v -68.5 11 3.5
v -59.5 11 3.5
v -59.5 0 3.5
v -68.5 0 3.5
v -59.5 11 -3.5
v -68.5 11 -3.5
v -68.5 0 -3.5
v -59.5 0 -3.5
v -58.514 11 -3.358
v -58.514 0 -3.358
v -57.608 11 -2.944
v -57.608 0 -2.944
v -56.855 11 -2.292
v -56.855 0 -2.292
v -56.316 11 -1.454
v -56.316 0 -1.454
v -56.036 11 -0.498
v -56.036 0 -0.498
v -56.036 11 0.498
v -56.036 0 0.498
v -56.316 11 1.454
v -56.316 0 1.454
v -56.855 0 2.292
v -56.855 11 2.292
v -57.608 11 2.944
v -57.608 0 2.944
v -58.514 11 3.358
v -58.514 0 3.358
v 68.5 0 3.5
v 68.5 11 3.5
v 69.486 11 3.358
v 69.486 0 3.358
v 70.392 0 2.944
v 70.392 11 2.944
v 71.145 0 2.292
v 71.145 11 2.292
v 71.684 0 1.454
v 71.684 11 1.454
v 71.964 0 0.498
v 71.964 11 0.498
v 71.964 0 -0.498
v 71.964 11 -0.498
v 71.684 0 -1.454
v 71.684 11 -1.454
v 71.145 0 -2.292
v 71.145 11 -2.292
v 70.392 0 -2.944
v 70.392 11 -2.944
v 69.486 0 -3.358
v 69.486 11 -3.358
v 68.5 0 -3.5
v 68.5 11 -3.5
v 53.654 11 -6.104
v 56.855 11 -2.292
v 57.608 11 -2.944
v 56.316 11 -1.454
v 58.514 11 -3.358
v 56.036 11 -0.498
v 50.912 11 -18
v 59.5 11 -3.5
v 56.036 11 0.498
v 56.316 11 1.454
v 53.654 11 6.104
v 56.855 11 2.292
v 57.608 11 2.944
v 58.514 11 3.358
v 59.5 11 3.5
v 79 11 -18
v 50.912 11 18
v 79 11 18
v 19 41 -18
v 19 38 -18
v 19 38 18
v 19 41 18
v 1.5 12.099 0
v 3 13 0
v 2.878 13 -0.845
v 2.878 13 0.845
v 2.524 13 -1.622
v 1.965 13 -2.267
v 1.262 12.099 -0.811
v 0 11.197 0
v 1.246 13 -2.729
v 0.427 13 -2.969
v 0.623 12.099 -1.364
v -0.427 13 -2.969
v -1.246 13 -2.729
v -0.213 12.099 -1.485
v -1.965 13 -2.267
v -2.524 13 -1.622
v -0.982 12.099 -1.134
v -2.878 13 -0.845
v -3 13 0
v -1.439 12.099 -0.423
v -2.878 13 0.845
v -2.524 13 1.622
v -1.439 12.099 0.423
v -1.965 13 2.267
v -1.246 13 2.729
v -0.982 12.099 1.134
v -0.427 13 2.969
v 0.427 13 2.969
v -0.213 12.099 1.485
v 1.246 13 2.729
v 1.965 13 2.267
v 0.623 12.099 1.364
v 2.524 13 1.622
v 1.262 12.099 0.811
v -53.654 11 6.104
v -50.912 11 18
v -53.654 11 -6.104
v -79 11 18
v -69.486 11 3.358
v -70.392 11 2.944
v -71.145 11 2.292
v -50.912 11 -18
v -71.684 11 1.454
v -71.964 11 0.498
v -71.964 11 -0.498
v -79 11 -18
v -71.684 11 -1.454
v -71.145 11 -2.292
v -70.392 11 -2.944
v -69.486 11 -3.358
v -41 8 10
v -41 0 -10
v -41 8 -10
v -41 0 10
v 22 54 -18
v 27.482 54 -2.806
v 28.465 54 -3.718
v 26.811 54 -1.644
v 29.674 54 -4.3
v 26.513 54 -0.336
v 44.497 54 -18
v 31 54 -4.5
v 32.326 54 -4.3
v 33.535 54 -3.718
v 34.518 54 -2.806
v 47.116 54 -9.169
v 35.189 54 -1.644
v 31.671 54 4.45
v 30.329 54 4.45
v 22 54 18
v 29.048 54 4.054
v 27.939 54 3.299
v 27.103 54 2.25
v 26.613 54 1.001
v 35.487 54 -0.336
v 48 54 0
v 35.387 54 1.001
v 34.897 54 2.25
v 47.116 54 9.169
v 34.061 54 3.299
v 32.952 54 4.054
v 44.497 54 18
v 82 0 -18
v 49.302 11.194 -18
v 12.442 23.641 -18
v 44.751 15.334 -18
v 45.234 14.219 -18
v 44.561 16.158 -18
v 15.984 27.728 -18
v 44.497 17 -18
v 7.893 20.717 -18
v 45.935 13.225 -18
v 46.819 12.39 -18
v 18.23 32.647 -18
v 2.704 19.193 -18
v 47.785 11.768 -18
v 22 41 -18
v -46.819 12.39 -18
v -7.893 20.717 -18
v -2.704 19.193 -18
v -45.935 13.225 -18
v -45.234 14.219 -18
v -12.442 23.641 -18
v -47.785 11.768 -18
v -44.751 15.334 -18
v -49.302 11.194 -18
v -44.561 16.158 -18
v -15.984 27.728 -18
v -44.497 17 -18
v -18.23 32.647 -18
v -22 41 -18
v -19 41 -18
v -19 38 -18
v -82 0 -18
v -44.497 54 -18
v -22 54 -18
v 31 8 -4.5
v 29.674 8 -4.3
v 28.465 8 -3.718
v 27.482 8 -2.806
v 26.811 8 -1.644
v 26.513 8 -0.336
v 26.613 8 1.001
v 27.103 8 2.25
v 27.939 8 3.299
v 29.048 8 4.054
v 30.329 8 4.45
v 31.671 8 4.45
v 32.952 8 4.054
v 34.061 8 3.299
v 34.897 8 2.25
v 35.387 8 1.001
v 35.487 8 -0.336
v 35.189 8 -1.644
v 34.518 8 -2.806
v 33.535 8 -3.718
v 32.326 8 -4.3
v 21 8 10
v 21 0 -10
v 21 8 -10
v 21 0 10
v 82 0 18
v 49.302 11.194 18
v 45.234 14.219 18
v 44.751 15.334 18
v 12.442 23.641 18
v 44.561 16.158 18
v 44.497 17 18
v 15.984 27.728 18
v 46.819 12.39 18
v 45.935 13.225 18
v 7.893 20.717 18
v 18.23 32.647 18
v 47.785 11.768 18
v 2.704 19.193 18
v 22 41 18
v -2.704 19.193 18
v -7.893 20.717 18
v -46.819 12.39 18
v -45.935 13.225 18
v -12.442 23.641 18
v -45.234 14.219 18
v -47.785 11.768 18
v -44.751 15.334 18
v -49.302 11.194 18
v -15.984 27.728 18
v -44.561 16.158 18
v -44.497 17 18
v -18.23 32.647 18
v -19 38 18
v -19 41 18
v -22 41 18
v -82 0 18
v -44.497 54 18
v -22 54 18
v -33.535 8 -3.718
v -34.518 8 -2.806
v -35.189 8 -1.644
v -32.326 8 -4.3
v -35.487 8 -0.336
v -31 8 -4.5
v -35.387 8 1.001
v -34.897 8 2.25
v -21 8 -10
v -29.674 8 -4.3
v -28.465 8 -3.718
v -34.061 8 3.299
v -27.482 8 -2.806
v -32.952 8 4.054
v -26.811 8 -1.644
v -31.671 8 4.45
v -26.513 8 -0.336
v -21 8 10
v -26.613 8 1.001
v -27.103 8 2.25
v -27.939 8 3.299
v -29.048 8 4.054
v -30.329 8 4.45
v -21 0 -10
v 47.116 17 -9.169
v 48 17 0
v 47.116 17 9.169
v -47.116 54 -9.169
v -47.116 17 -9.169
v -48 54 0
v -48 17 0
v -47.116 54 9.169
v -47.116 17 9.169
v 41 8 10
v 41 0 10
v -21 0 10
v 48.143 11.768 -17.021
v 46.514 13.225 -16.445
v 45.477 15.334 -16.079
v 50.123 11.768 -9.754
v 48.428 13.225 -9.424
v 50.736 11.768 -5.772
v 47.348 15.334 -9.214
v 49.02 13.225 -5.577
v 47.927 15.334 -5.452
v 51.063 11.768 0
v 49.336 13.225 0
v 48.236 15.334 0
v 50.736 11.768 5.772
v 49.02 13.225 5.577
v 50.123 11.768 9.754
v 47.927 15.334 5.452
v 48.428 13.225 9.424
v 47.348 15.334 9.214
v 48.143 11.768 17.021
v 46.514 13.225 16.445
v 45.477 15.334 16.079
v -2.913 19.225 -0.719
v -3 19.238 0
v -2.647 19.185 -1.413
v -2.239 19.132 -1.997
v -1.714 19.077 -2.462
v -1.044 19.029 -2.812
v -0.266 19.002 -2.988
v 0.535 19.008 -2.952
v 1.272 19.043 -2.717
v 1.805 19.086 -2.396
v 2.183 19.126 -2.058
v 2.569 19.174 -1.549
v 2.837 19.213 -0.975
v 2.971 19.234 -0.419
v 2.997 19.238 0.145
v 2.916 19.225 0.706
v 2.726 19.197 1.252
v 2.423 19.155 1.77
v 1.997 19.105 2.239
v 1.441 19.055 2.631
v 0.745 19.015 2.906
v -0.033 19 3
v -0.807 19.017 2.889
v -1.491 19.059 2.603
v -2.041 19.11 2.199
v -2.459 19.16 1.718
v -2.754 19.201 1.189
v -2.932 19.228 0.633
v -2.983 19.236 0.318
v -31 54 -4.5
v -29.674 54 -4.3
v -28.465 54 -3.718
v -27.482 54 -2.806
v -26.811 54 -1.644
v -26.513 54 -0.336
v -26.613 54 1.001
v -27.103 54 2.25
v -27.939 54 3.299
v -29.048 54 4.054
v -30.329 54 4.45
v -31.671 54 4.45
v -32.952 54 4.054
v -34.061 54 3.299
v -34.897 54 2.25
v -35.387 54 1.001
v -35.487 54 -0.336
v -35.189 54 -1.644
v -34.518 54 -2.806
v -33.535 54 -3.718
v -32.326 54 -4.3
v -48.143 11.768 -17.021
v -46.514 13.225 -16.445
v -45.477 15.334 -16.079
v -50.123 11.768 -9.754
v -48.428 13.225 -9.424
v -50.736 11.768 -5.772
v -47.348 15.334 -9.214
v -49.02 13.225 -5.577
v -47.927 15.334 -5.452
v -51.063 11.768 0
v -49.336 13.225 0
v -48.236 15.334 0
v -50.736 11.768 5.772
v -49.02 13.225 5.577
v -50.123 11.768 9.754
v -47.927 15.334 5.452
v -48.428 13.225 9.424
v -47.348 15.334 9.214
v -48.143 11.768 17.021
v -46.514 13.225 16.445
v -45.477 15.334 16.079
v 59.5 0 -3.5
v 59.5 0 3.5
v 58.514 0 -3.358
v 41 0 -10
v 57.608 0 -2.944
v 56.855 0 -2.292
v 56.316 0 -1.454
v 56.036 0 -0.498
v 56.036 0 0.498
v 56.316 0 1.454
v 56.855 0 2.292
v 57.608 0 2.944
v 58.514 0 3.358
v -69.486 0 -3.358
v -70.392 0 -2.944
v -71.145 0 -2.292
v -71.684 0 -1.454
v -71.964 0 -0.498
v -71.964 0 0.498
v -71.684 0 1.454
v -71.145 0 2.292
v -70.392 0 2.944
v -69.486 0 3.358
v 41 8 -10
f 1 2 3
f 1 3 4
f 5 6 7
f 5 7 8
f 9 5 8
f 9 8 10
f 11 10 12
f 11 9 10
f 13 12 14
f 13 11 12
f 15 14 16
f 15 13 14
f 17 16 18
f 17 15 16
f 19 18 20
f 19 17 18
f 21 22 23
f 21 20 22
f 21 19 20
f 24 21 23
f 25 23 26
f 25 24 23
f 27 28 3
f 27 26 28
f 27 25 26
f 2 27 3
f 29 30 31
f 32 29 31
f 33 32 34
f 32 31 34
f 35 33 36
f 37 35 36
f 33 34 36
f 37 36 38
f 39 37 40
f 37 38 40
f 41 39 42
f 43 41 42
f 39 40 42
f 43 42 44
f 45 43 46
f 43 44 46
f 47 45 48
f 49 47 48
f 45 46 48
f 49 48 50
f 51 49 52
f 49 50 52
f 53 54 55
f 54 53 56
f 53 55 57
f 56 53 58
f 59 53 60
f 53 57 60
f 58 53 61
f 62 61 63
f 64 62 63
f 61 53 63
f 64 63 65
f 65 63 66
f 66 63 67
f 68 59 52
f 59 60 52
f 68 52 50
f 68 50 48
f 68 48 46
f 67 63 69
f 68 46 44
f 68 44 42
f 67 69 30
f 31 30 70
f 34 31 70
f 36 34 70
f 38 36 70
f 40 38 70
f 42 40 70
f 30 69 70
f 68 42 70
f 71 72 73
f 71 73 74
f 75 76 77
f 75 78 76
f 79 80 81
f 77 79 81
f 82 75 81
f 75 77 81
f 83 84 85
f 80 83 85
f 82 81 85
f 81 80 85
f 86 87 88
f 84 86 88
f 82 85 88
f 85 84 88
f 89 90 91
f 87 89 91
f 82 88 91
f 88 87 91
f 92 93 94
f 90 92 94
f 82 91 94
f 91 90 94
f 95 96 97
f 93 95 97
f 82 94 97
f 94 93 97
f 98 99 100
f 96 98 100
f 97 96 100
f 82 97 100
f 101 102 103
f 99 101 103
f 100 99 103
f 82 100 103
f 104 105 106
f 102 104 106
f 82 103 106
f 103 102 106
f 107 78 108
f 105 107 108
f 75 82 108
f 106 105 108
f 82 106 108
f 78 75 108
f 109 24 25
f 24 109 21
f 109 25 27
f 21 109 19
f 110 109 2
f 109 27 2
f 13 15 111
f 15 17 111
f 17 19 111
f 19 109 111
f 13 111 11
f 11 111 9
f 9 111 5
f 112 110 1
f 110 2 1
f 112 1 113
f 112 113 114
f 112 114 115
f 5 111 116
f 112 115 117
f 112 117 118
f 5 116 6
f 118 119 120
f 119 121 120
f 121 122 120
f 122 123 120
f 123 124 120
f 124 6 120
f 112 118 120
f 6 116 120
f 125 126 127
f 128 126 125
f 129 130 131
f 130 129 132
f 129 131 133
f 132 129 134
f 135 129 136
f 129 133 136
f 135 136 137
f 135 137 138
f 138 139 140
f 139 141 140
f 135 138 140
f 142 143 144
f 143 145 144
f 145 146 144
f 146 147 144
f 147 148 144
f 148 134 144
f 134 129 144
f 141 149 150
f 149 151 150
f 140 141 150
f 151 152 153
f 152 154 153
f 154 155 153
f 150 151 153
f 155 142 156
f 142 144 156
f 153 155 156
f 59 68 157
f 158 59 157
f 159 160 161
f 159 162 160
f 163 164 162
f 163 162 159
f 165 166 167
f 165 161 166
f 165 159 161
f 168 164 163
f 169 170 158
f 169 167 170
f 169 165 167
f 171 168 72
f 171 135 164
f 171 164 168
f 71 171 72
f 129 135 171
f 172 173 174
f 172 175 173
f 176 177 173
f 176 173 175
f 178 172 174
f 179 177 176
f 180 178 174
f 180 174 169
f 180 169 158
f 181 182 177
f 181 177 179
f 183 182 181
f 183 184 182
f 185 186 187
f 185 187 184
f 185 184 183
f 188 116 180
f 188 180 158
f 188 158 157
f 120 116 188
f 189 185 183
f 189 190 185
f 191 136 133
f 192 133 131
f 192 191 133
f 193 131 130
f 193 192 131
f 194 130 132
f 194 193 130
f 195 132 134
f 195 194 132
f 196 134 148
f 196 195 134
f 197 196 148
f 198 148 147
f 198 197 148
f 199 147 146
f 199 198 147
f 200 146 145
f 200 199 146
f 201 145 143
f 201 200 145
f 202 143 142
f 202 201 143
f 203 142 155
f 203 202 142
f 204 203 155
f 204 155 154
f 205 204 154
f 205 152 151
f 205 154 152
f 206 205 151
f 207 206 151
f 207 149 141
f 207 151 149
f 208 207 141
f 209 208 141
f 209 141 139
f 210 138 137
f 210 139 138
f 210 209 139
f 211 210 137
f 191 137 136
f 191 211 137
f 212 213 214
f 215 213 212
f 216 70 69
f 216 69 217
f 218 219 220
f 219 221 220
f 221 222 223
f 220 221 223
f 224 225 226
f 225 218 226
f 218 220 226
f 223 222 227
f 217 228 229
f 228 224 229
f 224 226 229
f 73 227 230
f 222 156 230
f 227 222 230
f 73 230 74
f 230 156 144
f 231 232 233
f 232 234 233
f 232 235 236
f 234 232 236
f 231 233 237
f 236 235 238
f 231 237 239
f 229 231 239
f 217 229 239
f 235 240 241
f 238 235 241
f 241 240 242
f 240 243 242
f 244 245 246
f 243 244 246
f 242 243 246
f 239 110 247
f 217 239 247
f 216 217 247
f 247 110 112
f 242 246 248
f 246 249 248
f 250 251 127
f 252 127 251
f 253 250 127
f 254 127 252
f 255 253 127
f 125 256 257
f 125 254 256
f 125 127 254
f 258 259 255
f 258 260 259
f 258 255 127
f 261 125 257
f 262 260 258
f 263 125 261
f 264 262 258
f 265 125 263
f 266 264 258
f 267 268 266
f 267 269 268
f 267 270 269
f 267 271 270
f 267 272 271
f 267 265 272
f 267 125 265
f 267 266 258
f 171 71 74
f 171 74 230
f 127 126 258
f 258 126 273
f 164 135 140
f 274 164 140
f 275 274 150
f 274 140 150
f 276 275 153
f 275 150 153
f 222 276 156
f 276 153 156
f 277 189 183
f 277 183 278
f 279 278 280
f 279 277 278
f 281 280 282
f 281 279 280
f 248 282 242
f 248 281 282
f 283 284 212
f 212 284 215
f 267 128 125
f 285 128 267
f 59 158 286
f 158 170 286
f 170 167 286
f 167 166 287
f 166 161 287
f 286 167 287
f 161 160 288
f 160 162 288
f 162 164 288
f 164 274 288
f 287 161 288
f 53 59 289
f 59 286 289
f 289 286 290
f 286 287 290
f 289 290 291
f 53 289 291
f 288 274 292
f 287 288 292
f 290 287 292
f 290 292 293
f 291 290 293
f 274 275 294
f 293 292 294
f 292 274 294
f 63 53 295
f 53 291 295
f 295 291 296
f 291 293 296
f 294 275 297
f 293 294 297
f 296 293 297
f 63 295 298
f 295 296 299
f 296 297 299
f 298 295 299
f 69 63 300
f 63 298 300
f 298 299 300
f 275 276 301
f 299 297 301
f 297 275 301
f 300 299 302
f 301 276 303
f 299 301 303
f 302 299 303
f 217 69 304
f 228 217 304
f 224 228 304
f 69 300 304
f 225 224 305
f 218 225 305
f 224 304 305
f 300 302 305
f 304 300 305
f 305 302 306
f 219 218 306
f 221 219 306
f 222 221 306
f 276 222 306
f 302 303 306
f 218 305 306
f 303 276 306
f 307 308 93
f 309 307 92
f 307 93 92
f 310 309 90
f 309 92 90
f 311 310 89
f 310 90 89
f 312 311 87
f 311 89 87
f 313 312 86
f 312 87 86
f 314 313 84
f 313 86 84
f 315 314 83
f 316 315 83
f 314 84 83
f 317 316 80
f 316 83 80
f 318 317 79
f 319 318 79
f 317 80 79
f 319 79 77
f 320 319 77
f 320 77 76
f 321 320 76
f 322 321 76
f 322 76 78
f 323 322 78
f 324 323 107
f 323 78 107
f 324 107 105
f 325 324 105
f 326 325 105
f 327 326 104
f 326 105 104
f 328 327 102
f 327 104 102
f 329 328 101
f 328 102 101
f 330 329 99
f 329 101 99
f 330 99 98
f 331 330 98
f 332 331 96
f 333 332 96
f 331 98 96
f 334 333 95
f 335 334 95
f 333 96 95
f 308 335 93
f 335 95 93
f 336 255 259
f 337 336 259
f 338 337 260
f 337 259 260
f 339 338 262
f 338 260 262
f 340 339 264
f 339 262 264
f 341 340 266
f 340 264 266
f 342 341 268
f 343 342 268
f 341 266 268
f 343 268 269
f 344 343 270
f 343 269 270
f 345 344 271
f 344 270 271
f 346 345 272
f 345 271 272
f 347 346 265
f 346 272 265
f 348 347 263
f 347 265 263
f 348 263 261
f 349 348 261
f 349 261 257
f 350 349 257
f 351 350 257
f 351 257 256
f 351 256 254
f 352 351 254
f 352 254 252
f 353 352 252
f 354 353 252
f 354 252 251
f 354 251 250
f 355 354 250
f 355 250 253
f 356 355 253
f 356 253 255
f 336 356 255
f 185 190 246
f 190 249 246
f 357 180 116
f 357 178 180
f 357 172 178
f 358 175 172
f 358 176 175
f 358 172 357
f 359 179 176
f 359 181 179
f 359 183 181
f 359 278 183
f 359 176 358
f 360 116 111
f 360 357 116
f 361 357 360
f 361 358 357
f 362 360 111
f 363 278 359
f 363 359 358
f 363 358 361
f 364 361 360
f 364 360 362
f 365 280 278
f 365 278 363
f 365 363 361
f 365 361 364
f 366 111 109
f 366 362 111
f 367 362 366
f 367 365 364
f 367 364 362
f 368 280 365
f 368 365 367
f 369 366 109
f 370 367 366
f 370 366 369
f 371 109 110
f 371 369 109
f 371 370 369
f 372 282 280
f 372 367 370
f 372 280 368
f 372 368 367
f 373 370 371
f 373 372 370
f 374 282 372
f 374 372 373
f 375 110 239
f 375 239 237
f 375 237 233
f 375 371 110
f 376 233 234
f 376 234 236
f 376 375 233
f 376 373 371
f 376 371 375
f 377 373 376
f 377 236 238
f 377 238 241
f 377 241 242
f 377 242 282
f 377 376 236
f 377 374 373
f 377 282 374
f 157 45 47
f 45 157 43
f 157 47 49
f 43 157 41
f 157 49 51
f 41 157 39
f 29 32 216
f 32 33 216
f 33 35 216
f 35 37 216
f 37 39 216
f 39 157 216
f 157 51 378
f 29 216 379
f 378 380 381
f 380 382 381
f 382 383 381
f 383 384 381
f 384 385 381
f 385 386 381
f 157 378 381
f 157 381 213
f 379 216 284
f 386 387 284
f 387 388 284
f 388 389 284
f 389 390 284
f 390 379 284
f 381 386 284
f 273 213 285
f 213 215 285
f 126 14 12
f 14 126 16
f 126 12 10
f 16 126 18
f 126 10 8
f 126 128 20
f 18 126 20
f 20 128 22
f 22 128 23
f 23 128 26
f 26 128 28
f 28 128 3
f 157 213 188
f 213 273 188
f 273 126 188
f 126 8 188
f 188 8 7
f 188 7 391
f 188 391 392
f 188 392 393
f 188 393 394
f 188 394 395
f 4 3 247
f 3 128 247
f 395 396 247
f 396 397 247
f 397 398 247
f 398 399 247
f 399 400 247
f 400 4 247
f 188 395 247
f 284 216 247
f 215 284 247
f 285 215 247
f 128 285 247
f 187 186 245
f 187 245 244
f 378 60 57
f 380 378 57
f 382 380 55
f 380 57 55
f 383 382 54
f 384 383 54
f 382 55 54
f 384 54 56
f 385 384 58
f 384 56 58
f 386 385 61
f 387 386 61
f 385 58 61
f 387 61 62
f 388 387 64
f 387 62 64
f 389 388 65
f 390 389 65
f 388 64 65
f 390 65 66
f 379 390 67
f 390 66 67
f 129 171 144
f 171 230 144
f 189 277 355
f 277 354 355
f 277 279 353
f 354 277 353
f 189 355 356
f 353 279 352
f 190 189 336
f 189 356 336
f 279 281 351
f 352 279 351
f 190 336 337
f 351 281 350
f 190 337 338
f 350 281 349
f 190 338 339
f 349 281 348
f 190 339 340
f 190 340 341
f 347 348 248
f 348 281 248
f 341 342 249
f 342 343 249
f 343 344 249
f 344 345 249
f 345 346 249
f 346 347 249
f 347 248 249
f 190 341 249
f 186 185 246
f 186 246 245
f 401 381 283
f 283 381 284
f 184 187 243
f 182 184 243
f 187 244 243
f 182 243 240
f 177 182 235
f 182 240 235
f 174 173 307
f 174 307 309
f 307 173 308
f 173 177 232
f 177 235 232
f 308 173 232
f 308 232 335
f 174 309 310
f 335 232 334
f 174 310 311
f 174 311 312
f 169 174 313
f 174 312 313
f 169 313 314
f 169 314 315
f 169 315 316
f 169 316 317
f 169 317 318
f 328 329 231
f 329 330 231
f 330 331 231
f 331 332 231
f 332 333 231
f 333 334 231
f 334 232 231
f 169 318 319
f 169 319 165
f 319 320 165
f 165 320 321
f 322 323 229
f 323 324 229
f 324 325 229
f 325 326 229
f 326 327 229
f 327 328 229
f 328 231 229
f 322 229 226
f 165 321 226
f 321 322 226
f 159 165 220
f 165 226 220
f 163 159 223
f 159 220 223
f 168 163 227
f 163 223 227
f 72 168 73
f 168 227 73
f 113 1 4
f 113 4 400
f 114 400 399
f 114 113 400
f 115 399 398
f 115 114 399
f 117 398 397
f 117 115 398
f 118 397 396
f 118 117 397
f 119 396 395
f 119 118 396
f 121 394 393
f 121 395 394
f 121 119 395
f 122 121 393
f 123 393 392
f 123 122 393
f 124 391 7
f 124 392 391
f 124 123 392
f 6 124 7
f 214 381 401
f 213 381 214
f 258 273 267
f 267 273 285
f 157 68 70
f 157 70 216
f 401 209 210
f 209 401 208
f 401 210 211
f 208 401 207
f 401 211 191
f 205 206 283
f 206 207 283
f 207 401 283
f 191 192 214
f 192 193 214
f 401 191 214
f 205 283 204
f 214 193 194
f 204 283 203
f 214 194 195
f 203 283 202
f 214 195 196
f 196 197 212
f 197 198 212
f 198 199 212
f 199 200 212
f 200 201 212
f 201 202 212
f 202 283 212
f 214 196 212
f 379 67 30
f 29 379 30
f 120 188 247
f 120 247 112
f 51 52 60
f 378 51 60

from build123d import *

# Parameters (mm, degrees)
BOSS_EXTRUDE1_DEPTH       = 18
CUT_EXTRUDE1_DEPTH        = 43
CUT_EXTRUDE2_DEPTH        = 12
SKETCH6_W                 = 20
SKETCH6_H                 = 20
CUT_EXTRUDE3_DEPTH        = 8
SKETCH7_R                 = 4.5
CUT_EXTRUDE4_DEPTH        = 47
FILLET1_R                 = 6
F_6_0MM_DOWEL_HOLE1_D     = 6
F_6_0MM_DOWEL_HOLE1_DEPTH = 6
F_6_0MM_DOWEL_HOLE1_TIP   = 1.802581857


with BuildPart() as part:
    # Sketch1 → Boss-Extrude1 (new body, symmetric)
    with BuildSketch(Plane.XY):
        with BuildLine():
            Line((82, 0), (-82, 0))
            Line((-82, 0), (-79, 11))
            Line((-79, 11), (-50, 11))
            Line((-50, 11), (-50, 54))
            Line((-50, 54), (-22, 54))
            Line((-22, 54), (-22, 41))
            Line((-22, 41), (-19, 41))
            Line((-19, 41), (-19, 38))
            ThreePointArc((-19, 38), (0, 19), (19, 38))
            Line((19, 38), (19, 41))
            Line((19, 41), (22, 41))
            Line((22, 41), (22, 54))
            Line((22, 54), (50, 54))
            Line((50, 54), (50, 11))
            Line((50, 11), (79, 11))
            Line((79, 11), (82, 0))
        make_face()
    extrude(amount=BOSS_EXTRUDE1_DEPTH, both=True)

    # Sketch2 → Cut-Extrude1 (cut)
    with BuildSketch(Plane(origin=(0, 54, 0), x_dir=(1, 0, 0), z_dir=(0, 1, 0))):
        with BuildLine():
            Line((-44.497190923, -18), (-50, -18))
            Line((-50, -18), (-50, 18))
            Line((-50, 18), (-44.497190923, 18))
            ThreePointArc((-44.497190923, 18), (-48, 0), (-44.497190923, -18))
        make_face()
        with BuildLine():
            Line((50, 18), (44.497190923, 18))
            ThreePointArc((44.497190923, 18), (48, 0), (44.497190923, -18))
            Line((44.497190923, -18), (50, -18))
            Line((50, -18), (50, 18))
        make_face()
    extrude(amount=-CUT_EXTRUDE1_DEPTH, mode=Mode.SUBTRACT)

    # Sketch4 → Cut-Extrude2 (cut, through all)
    with BuildSketch(Plane(origin=(0, 11, 0), x_dir=(1, 0, 0), z_dir=(0, 1, 0))):
        with BuildLine():
            Line((-59.5, -3.5), (-68.5, -3.5))
            ThreePointArc((-68.5, -3.5), (-72, 0), (-68.5, 3.5))
            Line((-68.5, 3.5), (-59.5, 3.5))
            ThreePointArc((-59.5, 3.5), (-56, 0), (-59.5, -3.5))
        make_face()
    cut_extrude2 = extrude(amount=-CUT_EXTRUDE2_DEPTH, mode=Mode.SUBTRACT)

    # Sketch6 → Cut-Extrude3 (cut)
    with BuildSketch(Plane.XZ):
        with Locations((-31, 0)):
            Rectangle(SKETCH6_W, SKETCH6_H)
    cut_extrude3 = extrude(amount=-CUT_EXTRUDE3_DEPTH, mode=Mode.SUBTRACT)

    # Sketch7 → Cut-Extrude4 (cut, through all)
    with BuildSketch(Plane.XZ.offset(-8)):
        with Locations(Location((-31, 0, 0), (0, 0, 270))):  # turned: the seam where the file's is
            Circle(SKETCH7_R)
    cut_extrude4 = extrude(amount=-CUT_EXTRUDE4_DEPTH, mode=Mode.SUBTRACT)

    # Fillet1
    fillet1_edges = [part.edges().sort_by_distance(p)[0] for p in [
        (48, 11, 0),
        (-48, 11, 0),
    ]]
    fillet(fillet1_edges, radius=FILLET1_R)

    # Mirror6: Cut-Extrude2, Cut-Extrude3, Cut-Extrude4 across plane
    add(cut_extrude2.mirror(Plane(origin=(0, 0, 0), x_dir=(0, 0, 1), z_dir=(1, 0, 0))), mode=Mode.SUBTRACT)
    add(cut_extrude3.mirror(Plane(origin=(0, 0, 0), x_dir=(0, 0, 1), z_dir=(1, 0, 0))), mode=Mode.SUBTRACT)
    add(cut_extrude4.mirror(Plane(origin=(0, 0, 0), x_dir=(0, 0, 1), z_dir=(1, 0, 0))), mode=Mode.SUBTRACT)

    # Ø6.0mm Dowel Hole1
    with Locations(Plane(origin=(0, 19, 0), x_dir=(1, 0, 0), z_dir=(0, 1, 0))):
        with Locations((0, 0)):
            Hole(F_6_0MM_DOWEL_HOLE1_D / 2, depth=F_6_0MM_DOWEL_HOLE1_DEPTH)
            with Locations((0, 0, -(F_6_0MM_DOWEL_HOLE1_DEPTH + F_6_0MM_DOWEL_HOLE1_TIP / 2))):  # 118° drill point
                Cone(0, F_6_0MM_DOWEL_HOLE1_D / 2, F_6_0MM_DOWEL_HOLE1_TIP, mode=Mode.SUBTRACT)


solid = part.part
